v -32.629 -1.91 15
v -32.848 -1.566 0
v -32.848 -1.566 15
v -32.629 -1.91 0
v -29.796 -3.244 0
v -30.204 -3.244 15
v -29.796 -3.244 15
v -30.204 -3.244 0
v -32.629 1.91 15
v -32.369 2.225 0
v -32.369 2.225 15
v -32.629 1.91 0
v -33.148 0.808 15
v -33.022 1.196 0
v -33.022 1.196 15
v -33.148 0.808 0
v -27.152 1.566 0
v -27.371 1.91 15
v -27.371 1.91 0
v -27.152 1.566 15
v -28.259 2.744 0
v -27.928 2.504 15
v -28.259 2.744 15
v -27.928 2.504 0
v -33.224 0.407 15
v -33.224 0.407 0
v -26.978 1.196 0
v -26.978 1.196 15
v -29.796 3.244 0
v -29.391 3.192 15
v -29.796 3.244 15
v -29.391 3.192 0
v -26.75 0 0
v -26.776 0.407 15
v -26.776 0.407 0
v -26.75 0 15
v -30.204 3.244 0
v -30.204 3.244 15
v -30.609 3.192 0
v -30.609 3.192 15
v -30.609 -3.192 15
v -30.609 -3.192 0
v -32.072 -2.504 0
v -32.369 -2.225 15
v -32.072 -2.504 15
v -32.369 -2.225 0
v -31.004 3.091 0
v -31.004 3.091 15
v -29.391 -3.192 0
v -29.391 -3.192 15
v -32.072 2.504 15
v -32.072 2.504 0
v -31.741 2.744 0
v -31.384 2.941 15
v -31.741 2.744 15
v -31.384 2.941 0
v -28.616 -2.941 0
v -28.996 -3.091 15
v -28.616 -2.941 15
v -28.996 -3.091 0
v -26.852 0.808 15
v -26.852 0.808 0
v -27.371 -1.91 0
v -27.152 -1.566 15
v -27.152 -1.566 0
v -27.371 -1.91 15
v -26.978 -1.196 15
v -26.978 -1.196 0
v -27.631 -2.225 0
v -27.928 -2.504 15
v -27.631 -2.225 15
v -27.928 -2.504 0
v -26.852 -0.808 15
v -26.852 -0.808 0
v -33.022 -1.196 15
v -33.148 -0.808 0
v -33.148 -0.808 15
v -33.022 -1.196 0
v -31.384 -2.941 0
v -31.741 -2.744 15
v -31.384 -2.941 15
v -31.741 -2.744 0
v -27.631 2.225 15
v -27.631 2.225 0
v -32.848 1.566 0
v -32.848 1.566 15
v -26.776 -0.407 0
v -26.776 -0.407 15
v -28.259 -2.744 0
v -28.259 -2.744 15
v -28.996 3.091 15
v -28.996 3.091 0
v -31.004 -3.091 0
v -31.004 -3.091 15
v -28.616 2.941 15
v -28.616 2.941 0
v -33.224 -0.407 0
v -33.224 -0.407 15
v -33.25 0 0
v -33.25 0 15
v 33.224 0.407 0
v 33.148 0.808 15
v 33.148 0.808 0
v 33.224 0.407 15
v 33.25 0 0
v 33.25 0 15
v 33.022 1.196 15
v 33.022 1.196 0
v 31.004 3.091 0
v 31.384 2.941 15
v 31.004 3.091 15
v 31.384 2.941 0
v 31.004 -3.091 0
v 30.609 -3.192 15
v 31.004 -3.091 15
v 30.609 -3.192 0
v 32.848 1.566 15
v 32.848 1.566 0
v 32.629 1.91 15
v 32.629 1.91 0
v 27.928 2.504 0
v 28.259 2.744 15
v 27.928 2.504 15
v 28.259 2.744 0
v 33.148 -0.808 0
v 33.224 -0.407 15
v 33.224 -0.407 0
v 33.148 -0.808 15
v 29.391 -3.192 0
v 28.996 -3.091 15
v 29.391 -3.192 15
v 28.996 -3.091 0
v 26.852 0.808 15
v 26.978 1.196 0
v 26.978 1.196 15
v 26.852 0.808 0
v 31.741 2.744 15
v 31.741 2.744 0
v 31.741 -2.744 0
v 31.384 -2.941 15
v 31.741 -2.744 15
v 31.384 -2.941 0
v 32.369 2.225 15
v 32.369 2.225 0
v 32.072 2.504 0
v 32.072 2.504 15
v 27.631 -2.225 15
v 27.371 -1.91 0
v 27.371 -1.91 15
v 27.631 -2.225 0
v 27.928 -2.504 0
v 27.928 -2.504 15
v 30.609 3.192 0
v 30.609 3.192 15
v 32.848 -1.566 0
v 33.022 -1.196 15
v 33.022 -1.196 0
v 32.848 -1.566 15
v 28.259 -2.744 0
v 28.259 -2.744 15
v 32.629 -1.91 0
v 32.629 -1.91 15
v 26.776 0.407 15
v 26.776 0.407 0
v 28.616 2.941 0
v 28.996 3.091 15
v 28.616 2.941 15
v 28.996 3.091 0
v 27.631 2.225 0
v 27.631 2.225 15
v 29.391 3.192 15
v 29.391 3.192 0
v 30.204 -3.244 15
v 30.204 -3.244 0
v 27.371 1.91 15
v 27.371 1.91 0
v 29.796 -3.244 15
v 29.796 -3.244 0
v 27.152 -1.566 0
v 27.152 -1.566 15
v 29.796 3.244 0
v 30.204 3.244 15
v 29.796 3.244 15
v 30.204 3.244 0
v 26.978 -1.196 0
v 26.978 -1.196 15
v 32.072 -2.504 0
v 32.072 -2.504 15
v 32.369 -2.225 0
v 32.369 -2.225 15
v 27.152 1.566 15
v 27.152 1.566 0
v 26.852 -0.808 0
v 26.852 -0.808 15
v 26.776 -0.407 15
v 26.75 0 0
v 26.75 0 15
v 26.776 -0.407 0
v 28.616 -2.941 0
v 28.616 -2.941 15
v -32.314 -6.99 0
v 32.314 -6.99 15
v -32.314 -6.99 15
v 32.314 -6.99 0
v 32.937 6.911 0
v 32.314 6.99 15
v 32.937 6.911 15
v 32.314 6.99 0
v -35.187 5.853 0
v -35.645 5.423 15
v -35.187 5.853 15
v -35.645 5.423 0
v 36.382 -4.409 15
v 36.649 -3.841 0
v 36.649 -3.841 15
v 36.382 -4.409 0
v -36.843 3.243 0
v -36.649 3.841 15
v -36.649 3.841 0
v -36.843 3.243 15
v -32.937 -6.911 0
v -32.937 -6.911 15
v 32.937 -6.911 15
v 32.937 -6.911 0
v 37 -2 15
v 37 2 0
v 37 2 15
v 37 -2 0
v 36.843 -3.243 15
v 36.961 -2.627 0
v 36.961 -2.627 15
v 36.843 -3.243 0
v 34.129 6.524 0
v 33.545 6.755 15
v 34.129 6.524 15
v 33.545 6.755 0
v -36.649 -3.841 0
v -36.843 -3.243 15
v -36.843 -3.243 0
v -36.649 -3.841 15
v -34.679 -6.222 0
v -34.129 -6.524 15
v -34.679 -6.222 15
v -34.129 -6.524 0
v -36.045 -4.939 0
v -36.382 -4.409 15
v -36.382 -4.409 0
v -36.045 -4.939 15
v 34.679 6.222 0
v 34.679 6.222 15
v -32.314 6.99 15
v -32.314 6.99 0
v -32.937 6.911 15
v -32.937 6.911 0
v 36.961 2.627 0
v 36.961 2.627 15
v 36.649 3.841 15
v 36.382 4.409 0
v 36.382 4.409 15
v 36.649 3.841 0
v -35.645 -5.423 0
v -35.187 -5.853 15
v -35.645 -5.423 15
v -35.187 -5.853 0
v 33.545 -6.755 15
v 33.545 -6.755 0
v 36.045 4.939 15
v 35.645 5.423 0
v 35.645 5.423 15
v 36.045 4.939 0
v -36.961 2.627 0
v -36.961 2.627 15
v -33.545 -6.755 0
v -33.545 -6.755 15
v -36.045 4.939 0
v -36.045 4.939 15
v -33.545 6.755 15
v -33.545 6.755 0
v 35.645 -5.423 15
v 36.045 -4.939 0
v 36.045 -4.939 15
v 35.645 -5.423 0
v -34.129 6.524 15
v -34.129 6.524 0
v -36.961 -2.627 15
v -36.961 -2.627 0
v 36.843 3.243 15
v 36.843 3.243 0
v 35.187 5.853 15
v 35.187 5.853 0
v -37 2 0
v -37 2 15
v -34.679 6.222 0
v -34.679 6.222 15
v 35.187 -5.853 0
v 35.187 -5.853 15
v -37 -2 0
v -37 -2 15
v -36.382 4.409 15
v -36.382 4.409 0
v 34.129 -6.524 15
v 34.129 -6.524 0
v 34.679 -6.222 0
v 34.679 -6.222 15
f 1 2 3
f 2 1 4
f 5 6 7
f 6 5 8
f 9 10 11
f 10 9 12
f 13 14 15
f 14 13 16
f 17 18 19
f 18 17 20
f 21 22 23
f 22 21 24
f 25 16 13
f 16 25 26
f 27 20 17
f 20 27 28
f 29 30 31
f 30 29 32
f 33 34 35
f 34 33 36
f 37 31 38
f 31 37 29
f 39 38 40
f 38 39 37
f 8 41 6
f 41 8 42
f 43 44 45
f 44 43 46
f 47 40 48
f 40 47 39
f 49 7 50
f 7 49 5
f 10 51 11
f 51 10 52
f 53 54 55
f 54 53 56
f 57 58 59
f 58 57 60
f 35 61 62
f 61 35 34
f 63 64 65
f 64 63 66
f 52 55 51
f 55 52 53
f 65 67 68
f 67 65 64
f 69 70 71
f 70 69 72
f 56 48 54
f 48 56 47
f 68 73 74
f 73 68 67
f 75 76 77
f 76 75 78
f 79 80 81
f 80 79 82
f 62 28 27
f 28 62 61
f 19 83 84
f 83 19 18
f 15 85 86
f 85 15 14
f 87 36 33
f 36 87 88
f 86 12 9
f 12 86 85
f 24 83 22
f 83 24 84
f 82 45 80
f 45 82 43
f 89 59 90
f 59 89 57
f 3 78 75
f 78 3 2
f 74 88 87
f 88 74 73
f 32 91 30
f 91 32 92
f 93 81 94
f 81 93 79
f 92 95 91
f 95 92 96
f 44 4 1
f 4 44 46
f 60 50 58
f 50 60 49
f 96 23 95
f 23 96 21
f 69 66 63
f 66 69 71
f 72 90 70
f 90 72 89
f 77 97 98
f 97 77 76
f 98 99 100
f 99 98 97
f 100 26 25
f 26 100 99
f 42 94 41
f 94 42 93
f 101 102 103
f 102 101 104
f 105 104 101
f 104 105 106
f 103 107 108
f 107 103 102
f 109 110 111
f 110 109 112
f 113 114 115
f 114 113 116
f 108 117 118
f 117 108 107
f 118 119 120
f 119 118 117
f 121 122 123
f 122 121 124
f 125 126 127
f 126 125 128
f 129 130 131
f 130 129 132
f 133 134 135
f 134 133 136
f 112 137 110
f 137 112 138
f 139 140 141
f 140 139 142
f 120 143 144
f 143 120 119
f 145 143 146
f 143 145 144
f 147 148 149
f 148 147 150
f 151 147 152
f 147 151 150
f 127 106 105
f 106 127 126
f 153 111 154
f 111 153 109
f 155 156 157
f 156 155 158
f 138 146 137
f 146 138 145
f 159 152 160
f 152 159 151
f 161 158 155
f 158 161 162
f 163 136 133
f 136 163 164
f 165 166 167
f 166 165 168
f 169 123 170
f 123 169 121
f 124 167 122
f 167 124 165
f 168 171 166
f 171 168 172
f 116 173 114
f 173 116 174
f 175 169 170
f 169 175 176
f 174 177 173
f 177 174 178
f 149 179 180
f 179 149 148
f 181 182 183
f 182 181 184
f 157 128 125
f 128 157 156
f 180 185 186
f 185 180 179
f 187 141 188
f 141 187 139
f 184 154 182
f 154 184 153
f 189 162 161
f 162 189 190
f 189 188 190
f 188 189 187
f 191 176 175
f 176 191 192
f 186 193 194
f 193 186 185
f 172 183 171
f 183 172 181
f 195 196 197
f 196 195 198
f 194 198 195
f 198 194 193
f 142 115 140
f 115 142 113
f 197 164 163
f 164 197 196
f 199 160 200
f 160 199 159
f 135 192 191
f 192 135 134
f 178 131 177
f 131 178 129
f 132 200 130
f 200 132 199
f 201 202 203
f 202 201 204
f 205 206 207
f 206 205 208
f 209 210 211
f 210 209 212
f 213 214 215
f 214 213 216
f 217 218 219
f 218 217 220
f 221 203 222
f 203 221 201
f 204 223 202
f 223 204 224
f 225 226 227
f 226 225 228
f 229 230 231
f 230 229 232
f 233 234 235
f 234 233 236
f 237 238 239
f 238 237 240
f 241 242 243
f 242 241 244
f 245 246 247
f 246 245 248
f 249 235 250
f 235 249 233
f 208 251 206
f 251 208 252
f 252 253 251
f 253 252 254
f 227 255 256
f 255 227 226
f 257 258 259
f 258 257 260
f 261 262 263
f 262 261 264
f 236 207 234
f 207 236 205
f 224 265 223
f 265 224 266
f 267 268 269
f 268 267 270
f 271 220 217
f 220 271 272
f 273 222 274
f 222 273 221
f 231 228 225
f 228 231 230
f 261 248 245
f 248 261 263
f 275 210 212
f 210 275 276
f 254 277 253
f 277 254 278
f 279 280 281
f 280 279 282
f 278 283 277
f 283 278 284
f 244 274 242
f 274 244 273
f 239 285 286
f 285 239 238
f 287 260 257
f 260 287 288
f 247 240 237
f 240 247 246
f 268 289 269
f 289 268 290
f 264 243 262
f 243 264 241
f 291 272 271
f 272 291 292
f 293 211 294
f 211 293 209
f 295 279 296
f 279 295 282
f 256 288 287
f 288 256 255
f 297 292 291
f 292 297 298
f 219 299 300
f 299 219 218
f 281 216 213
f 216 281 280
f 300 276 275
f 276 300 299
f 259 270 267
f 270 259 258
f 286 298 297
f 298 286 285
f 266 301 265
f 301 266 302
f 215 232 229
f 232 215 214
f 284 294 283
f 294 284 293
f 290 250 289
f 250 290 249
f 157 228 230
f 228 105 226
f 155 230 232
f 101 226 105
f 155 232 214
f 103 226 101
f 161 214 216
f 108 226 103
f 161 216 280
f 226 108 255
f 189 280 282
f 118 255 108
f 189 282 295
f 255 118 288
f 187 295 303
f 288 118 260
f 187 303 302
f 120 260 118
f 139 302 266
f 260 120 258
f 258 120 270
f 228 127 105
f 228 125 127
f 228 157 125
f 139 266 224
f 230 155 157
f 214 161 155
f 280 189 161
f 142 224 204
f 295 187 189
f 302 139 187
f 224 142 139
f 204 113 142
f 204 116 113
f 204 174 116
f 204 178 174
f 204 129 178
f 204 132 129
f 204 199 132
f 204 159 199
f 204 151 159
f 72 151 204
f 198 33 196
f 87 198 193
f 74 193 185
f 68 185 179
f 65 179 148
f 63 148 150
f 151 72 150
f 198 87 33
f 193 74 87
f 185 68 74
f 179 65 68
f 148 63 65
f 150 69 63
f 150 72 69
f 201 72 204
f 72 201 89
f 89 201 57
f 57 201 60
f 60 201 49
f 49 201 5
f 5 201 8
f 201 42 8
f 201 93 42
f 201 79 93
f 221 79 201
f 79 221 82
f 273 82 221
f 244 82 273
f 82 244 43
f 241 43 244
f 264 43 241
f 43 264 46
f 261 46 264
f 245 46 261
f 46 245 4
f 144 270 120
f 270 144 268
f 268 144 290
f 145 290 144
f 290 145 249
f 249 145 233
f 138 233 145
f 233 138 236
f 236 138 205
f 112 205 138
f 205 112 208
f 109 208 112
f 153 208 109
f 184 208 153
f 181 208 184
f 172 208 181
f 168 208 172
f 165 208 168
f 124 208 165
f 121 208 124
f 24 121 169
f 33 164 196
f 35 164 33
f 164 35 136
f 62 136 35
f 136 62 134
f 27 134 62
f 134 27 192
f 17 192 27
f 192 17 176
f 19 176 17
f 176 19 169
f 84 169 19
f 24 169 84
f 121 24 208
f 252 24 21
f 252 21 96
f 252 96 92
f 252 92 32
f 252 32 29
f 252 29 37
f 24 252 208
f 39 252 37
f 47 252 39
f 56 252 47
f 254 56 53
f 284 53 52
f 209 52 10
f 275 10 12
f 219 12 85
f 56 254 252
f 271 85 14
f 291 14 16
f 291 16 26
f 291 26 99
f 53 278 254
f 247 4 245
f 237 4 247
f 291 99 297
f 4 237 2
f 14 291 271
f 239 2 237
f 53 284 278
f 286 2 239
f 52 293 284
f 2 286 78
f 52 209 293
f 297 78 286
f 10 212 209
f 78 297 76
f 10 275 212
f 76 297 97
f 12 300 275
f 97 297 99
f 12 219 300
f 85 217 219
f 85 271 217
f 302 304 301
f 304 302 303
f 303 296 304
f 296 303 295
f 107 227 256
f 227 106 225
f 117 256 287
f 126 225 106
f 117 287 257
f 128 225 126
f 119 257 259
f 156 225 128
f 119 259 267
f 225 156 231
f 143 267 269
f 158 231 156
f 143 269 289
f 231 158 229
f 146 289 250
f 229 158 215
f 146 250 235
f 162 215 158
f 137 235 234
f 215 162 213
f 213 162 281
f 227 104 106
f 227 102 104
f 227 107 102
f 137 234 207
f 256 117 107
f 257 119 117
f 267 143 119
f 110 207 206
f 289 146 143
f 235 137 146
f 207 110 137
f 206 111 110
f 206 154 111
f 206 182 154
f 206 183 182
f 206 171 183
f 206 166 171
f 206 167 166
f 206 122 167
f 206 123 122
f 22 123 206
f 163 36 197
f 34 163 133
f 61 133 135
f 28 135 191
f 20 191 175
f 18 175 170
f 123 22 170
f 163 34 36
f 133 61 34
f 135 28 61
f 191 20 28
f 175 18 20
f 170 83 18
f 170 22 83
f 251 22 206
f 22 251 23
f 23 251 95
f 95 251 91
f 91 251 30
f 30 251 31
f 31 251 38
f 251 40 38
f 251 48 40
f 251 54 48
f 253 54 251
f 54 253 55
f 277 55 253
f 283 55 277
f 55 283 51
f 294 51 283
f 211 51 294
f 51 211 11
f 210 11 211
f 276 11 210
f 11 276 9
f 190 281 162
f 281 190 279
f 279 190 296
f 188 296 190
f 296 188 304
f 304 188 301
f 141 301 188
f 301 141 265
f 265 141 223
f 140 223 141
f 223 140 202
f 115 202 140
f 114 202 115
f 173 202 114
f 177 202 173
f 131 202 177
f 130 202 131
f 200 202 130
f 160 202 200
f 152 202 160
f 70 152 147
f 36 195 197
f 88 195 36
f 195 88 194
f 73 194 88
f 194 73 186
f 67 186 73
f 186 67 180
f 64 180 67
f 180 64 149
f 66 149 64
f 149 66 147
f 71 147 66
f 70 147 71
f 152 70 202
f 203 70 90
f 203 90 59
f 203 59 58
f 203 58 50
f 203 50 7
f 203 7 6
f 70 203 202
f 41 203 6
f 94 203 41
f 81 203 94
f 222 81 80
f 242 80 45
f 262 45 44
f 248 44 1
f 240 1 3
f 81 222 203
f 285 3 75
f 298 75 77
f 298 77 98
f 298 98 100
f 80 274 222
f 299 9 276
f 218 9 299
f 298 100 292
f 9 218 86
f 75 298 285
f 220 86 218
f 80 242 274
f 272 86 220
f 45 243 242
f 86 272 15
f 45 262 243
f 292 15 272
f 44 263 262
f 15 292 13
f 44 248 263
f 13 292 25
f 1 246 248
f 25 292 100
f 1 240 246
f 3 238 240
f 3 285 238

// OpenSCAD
$fn = 50;


difference() {
	union() {
		hull() {
			translate(v = [-32.0000000000, 2.0000000000, 0]) {
				cylinder(h = 15, r = 5);
			}
			translate(v = [32.0000000000, 2.0000000000, 0]) {
				cylinder(h = 15, r = 5);
			}
			translate(v = [-32.0000000000, -2.0000000000, 0]) {
				cylinder(h = 15, r = 5);
			}
			translate(v = [32.0000000000, -2.0000000000, 0]) {
				cylinder(h = 15, r = 5);
			}
		}
	}
	union() {
		translate(v = [-30.0000000000, 0.0000000000, -100.0000000000]) {
			cylinder(h = 200, r = 3.2500000000);
		}
		translate(v = [-30.0000000000, 0.0000000000, -100.0000000000]) {
			cylinder(h = 200, r = 3.2500000000);
		}
		translate(v = [30.0000000000, 0.0000000000, -100.0000000000]) {
			cylinder(h = 200, r = 3.2500000000);
		}
		translate(v = [30.0000000000, 0.0000000000, -100.0000000000]) {
			cylinder(h = 200, r = 3.2500000000);
		}
	}
}
